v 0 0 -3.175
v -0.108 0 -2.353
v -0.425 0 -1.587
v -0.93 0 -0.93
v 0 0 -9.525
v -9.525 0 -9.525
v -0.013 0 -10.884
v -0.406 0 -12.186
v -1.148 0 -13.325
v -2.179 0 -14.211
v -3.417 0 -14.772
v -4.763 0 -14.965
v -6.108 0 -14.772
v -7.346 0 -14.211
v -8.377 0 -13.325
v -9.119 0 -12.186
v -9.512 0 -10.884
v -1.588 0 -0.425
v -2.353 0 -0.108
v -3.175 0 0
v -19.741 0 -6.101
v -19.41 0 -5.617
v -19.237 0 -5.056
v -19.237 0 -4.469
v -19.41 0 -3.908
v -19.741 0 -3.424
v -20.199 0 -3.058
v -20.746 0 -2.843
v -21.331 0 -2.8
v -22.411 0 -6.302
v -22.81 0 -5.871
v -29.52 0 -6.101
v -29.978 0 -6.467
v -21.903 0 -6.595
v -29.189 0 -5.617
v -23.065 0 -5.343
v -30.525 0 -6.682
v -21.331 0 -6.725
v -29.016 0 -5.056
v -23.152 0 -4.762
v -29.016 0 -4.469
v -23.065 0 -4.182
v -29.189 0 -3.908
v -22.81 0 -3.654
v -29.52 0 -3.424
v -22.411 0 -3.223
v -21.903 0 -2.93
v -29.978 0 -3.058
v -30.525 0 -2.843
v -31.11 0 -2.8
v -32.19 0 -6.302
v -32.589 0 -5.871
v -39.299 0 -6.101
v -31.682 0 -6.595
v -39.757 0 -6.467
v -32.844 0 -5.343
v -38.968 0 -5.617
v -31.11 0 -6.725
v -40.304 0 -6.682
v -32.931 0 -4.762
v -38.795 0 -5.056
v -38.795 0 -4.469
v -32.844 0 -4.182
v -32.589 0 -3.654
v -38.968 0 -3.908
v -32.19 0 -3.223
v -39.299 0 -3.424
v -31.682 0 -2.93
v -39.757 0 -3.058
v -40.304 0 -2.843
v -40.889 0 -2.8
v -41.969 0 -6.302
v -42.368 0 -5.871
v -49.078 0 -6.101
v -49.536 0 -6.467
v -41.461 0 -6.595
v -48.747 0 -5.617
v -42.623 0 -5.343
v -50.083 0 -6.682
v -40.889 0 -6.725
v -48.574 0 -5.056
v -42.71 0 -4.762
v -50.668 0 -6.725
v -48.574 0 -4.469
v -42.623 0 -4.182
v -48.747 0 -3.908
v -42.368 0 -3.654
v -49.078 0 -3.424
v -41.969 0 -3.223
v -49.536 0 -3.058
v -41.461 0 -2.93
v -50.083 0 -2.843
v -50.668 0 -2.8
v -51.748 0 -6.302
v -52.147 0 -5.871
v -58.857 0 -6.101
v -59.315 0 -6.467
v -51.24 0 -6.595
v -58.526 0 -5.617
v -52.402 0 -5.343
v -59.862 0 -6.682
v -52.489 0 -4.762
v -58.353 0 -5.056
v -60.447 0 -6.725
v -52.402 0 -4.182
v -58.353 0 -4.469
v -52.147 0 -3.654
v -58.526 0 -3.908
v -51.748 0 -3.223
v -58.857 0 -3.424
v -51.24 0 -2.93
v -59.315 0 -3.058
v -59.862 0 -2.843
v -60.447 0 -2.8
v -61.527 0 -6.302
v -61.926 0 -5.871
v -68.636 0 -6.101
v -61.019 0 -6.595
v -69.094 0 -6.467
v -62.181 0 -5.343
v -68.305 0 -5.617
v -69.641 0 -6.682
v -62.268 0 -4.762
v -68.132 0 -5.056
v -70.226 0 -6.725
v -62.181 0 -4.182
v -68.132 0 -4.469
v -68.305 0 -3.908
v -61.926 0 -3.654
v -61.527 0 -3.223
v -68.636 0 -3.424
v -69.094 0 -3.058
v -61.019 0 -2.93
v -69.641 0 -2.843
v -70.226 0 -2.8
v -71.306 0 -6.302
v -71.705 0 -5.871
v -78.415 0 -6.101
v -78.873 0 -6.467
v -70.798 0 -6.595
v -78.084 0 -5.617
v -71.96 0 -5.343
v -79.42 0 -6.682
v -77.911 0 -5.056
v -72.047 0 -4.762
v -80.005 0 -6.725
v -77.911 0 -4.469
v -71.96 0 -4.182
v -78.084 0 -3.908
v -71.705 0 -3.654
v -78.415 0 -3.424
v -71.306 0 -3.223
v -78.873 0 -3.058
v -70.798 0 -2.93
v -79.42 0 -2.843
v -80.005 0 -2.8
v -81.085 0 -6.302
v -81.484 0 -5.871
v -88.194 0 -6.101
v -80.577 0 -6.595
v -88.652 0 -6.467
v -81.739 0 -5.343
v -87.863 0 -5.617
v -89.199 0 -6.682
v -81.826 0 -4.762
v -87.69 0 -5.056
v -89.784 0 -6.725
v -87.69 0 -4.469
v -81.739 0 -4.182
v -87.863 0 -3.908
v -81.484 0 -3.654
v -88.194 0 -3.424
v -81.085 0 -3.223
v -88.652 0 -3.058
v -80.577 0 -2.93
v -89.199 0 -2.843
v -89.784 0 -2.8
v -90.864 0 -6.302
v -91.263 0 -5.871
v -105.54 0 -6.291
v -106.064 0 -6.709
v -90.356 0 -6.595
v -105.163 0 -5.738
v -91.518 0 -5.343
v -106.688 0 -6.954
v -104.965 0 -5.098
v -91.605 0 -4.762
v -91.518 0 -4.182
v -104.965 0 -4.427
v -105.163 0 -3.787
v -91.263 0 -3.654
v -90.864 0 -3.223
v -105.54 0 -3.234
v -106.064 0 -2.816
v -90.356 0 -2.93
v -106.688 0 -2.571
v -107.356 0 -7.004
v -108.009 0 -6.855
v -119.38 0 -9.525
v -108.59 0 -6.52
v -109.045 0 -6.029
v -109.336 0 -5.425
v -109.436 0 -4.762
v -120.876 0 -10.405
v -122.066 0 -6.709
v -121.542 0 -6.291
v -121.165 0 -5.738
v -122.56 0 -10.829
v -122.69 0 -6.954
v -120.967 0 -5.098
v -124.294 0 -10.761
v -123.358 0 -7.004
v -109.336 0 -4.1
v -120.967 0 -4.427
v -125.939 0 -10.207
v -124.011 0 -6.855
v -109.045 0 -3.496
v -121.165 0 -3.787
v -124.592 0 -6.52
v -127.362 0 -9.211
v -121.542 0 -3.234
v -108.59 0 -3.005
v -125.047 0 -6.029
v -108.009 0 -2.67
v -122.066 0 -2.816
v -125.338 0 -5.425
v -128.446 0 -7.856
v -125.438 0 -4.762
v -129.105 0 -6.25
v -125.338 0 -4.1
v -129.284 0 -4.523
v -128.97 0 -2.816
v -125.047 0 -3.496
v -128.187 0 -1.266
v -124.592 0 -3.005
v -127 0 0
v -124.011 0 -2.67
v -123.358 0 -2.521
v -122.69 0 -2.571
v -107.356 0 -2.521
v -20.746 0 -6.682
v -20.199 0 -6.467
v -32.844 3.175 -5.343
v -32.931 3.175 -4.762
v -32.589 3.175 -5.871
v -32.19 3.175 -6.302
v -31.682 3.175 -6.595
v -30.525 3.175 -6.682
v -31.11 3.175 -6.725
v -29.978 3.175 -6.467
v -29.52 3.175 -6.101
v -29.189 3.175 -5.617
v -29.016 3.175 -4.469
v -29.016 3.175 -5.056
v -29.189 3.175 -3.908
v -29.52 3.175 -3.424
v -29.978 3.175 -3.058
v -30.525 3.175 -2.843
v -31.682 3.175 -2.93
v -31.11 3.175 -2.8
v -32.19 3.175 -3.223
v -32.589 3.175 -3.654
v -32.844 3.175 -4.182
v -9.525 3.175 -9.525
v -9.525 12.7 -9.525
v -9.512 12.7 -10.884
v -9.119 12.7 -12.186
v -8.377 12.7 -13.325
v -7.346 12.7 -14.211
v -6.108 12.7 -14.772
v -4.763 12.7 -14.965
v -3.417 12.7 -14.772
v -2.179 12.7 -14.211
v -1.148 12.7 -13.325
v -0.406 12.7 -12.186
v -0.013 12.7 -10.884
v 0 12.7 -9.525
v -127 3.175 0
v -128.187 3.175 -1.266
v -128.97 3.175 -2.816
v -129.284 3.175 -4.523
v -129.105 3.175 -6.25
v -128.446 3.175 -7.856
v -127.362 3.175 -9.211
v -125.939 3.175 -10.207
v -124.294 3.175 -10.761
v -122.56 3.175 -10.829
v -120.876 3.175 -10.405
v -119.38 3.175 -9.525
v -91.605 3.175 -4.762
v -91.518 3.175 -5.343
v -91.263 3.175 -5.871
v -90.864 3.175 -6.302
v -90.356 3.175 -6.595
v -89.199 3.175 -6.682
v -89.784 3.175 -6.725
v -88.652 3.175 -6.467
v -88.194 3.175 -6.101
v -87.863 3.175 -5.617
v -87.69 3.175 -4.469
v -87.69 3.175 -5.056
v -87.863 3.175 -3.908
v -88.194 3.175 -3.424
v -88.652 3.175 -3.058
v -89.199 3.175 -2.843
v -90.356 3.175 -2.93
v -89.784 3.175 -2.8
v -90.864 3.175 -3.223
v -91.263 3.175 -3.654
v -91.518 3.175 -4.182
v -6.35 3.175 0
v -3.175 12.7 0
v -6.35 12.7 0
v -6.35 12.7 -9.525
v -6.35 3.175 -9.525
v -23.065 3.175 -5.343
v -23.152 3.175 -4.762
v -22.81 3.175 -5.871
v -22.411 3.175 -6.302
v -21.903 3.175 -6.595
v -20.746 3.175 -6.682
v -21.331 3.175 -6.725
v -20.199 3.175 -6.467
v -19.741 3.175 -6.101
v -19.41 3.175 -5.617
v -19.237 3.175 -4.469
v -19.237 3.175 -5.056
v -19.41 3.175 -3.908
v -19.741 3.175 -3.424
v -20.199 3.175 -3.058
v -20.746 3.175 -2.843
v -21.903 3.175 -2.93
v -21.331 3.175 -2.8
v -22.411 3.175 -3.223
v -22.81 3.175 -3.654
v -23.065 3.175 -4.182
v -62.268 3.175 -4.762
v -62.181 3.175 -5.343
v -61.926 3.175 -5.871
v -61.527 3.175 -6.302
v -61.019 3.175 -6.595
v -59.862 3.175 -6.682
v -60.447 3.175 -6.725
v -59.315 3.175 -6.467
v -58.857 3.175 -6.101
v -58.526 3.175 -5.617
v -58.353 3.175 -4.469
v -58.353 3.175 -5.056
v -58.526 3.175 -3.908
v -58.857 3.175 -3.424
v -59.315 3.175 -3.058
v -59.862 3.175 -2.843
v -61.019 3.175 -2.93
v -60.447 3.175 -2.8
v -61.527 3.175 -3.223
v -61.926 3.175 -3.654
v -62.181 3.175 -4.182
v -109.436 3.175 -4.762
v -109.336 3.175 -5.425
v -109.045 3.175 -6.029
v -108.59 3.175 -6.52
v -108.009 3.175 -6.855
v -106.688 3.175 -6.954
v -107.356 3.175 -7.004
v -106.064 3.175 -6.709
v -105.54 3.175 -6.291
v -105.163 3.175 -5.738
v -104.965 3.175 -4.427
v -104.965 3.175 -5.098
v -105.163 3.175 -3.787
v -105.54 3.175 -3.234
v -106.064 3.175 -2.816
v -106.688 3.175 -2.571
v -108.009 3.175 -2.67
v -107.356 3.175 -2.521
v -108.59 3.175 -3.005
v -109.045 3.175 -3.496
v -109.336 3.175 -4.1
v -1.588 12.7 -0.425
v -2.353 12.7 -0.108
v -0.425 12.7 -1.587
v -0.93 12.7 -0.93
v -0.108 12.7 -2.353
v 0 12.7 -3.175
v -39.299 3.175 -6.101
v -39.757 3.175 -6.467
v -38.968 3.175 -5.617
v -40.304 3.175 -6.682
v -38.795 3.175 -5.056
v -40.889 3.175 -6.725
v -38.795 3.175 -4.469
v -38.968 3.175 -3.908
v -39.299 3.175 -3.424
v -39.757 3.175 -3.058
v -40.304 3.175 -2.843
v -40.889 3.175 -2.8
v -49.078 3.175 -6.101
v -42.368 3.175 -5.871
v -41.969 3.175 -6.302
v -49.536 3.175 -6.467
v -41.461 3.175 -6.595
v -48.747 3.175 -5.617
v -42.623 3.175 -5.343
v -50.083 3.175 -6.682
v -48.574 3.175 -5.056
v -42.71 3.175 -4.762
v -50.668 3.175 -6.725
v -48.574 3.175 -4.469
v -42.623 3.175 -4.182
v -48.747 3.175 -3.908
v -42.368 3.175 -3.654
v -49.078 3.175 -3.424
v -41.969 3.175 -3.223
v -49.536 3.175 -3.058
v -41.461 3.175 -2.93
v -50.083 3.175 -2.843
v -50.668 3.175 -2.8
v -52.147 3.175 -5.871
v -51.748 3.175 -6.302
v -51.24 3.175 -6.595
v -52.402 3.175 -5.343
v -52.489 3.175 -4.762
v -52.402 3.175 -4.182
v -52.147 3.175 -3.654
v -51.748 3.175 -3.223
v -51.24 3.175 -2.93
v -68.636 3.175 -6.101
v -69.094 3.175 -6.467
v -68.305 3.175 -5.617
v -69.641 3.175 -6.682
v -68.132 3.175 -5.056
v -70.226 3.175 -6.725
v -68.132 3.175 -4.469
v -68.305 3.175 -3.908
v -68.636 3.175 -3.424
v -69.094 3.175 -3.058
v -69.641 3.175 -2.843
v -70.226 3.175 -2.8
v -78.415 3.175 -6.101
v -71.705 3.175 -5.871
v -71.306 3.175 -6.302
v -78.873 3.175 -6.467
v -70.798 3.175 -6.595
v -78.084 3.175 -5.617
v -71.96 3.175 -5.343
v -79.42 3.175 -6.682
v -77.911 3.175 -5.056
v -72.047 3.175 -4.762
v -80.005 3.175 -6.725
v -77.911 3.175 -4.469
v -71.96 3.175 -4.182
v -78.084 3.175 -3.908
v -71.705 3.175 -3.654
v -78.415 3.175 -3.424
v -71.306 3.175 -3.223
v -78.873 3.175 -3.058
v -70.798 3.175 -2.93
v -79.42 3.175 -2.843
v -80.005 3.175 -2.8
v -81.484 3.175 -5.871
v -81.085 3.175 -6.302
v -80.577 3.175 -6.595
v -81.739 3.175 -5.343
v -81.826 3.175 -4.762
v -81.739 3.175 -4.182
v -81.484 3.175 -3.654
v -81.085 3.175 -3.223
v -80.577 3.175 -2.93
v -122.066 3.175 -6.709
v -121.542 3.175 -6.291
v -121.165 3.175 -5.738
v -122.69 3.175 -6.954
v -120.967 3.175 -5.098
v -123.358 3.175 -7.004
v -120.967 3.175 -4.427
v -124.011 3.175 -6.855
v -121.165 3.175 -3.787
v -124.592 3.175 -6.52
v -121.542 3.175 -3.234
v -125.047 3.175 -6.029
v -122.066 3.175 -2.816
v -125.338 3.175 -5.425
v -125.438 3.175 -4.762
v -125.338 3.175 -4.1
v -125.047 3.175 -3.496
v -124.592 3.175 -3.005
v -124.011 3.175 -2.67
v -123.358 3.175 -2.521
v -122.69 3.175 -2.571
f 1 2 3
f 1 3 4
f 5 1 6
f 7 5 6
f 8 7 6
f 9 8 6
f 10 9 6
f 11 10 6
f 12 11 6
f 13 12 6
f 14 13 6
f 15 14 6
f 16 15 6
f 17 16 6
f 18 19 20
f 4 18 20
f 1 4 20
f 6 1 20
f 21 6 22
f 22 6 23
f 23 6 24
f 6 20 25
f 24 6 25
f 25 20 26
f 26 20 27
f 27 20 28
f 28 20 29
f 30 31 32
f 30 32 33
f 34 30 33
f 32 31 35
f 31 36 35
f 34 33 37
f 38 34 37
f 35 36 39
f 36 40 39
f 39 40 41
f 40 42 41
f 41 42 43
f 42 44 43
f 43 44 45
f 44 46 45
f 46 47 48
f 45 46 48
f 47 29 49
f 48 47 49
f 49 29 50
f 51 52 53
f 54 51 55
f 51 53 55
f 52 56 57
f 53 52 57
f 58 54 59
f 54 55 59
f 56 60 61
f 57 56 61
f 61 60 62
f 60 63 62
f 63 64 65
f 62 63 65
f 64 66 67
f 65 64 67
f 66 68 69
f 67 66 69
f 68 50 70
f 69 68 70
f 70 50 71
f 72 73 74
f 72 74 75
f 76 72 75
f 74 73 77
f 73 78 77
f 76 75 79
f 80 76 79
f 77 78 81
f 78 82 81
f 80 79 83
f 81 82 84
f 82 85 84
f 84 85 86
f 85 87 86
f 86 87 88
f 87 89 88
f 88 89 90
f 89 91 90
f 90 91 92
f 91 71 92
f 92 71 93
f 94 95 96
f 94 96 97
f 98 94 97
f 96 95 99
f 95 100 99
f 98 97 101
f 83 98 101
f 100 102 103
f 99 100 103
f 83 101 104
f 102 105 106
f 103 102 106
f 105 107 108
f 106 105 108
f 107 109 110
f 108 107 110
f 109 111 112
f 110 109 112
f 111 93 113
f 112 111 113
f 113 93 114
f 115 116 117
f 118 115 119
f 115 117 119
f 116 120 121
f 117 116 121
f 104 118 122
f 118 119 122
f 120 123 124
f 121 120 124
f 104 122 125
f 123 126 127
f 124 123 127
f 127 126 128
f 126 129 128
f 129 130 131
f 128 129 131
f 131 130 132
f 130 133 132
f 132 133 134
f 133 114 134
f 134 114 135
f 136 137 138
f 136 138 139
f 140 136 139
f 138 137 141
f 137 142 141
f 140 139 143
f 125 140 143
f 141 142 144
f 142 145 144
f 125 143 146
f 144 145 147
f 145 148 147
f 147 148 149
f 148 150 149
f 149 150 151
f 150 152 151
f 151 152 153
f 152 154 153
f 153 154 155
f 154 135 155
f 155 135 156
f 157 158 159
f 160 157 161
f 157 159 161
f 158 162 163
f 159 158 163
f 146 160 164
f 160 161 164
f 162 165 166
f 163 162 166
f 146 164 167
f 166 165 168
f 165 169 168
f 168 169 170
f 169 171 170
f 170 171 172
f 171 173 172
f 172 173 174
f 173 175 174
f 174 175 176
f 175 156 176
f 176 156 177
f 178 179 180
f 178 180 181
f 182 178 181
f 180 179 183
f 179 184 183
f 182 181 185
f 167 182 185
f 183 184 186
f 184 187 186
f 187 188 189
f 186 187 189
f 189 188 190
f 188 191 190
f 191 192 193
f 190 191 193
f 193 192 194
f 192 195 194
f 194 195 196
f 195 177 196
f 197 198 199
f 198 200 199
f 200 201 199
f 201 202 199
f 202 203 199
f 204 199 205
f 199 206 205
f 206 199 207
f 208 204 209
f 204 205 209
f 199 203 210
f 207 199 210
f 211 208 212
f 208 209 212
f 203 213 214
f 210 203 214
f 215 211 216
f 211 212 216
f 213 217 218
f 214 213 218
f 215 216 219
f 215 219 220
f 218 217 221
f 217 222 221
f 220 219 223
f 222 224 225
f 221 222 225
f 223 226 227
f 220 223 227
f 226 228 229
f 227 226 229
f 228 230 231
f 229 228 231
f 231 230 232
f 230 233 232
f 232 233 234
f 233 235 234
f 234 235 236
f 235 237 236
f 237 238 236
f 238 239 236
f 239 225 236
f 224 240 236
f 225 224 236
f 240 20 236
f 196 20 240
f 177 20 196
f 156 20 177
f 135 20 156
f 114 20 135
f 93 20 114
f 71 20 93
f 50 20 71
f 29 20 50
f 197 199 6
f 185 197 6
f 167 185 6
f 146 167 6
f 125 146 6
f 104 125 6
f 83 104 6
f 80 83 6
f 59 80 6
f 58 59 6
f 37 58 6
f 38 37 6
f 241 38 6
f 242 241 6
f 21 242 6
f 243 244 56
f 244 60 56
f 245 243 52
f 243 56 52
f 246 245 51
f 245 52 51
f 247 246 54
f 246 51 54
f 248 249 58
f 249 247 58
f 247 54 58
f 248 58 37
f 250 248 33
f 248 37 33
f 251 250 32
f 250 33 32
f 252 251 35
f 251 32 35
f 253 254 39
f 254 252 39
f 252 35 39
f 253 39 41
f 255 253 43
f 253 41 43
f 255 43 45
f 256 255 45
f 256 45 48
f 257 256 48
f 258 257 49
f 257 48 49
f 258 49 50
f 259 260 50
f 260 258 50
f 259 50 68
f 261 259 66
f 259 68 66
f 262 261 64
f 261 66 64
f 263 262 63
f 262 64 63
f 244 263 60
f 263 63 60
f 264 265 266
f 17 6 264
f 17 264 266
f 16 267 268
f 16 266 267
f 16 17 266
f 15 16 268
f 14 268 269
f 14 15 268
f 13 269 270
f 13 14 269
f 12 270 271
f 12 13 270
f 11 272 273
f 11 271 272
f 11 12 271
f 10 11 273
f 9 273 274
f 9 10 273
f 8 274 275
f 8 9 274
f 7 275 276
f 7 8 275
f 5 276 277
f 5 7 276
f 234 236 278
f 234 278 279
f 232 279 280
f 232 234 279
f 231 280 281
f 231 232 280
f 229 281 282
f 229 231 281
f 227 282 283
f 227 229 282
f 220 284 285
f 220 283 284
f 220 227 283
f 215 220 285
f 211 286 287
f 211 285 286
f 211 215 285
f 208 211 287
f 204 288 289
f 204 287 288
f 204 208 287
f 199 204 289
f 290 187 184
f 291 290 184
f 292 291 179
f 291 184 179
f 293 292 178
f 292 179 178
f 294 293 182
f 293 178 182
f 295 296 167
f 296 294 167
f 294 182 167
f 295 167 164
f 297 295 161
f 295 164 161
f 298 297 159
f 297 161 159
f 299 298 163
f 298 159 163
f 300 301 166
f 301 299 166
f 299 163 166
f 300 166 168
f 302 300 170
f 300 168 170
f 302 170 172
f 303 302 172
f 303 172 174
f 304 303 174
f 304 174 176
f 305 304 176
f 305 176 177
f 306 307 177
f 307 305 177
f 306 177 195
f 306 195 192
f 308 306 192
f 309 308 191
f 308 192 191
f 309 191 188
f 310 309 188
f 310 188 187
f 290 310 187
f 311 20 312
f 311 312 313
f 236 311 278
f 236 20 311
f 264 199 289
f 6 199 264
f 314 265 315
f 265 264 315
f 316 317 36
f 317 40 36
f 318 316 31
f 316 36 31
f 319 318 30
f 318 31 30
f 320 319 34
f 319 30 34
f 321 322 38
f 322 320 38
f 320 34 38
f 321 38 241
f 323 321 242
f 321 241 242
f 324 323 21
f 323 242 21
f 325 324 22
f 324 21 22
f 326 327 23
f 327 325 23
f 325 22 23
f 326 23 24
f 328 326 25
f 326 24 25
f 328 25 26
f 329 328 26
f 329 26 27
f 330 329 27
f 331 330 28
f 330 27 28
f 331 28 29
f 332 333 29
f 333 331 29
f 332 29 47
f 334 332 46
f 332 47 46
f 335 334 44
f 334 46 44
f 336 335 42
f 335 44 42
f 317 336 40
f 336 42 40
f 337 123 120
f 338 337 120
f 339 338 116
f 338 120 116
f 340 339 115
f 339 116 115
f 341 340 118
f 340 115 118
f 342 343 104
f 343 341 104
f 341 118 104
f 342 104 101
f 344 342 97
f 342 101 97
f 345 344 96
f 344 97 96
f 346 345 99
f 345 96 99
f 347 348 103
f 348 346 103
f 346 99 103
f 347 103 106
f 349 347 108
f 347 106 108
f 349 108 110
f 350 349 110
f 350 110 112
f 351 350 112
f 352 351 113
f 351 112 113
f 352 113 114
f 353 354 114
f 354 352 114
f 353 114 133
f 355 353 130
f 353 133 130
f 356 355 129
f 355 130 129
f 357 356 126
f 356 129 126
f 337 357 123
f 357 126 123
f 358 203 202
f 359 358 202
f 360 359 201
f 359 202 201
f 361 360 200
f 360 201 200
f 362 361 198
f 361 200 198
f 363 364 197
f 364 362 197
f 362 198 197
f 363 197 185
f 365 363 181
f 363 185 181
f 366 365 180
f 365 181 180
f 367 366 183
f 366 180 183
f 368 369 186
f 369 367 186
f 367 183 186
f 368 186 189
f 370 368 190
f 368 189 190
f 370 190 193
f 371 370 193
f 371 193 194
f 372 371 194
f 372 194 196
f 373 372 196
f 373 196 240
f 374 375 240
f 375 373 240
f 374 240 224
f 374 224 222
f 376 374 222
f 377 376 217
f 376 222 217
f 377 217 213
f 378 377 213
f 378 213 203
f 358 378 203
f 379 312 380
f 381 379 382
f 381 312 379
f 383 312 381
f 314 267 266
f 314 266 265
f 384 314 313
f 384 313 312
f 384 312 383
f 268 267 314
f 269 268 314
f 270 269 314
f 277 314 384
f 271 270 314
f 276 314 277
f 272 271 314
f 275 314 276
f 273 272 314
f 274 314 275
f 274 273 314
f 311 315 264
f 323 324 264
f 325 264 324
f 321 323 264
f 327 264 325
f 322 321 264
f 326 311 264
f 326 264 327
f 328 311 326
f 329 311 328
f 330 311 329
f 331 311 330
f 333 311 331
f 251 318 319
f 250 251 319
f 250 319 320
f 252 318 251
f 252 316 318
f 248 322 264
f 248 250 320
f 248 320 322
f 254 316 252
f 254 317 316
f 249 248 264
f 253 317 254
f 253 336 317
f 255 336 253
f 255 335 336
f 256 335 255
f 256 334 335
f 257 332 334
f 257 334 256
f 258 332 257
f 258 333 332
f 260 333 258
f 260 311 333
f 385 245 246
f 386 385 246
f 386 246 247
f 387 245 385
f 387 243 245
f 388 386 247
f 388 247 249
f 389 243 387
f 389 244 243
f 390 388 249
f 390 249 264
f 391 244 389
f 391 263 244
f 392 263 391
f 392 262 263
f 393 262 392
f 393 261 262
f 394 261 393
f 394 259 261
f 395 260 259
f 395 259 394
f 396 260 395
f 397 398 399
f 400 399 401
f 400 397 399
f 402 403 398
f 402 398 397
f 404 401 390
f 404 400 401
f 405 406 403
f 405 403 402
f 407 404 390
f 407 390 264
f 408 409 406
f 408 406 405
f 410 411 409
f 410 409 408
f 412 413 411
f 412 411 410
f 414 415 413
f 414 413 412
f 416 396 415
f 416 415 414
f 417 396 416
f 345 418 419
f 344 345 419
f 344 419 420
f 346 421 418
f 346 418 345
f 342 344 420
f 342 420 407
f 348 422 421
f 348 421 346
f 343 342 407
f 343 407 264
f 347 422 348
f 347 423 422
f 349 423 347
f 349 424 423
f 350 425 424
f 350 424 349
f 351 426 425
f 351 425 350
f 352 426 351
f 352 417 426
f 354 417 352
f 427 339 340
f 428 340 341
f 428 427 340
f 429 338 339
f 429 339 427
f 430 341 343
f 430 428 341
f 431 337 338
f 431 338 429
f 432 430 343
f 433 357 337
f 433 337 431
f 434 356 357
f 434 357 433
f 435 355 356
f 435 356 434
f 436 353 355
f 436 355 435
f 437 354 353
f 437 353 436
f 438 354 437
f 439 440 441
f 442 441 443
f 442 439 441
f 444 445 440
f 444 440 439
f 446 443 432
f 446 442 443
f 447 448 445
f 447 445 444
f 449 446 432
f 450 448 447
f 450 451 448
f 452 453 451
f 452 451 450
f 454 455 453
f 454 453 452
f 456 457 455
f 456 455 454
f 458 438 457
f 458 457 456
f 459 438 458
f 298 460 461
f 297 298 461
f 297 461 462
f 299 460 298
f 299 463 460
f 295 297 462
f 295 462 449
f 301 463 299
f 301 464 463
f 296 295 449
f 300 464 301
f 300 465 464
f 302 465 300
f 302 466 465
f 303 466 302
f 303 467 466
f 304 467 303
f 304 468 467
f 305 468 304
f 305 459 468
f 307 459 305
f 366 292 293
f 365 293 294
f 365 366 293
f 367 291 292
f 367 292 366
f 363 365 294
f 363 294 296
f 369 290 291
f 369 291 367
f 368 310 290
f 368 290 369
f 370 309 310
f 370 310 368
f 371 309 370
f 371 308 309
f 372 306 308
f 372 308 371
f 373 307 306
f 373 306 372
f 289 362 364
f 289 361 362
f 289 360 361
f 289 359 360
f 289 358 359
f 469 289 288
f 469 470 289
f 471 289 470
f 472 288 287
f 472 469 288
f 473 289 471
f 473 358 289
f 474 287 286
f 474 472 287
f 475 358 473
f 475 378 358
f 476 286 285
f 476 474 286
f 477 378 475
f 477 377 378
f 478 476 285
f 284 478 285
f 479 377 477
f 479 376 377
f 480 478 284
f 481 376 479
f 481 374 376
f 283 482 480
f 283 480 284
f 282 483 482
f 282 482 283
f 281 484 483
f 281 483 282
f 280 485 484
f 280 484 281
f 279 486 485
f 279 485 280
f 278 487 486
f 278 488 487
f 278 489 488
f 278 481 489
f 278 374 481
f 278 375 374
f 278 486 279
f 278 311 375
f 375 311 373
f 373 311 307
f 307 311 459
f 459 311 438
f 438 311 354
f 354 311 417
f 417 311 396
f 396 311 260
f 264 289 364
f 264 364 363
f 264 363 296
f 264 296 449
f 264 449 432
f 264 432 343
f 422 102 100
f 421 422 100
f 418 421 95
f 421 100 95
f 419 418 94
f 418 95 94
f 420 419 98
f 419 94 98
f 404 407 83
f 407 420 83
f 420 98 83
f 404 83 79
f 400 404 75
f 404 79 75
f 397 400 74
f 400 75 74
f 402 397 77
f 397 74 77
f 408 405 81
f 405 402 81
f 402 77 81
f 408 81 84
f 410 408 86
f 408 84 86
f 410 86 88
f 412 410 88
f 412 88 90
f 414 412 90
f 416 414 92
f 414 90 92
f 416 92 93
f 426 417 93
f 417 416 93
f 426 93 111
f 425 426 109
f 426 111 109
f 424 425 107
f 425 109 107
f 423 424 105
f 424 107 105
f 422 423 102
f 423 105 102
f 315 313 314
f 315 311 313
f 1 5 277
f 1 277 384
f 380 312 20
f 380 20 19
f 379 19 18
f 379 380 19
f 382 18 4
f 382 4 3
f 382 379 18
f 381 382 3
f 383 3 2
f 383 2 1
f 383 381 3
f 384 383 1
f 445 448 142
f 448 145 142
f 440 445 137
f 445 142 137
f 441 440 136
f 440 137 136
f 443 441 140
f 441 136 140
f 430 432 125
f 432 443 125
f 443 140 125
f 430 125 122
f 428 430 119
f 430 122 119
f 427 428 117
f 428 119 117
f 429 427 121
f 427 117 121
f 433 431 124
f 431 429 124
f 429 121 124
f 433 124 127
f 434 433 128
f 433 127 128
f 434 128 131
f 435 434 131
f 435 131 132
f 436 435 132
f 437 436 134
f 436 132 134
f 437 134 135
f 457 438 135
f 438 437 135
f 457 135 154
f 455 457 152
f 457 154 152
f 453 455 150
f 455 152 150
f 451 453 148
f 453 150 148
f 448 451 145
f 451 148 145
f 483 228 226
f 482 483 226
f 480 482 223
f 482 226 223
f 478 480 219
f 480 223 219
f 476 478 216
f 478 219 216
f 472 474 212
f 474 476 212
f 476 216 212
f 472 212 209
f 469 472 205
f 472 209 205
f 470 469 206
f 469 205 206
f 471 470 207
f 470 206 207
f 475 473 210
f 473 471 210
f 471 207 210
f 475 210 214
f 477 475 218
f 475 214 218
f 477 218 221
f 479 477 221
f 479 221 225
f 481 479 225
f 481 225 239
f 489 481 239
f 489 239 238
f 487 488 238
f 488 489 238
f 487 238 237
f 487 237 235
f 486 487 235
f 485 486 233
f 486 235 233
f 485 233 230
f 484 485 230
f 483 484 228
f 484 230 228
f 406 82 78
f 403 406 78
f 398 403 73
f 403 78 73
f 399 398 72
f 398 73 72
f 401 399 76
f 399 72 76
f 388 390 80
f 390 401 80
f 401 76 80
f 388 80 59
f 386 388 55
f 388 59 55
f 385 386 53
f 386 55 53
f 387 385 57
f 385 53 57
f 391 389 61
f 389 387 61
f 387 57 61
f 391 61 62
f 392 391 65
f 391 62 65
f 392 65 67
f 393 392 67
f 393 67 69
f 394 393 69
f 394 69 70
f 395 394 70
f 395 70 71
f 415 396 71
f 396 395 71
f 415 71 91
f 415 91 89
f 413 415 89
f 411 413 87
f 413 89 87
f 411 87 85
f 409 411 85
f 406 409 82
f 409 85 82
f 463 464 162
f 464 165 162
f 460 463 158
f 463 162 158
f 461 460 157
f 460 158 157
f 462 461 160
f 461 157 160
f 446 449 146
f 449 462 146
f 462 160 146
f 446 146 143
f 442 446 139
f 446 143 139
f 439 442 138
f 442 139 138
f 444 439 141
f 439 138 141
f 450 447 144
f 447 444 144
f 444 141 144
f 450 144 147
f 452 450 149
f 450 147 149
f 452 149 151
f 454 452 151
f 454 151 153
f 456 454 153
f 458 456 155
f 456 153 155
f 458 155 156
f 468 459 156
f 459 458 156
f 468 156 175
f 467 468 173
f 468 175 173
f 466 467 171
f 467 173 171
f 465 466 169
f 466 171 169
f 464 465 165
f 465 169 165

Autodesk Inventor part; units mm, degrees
ref_plane "YZ Plane" through (0, 0, 0) normal (1, 0, 0) x (0, 1, 0)
ref_plane "XZ Plane" through (0, 0, 0) normal (0, 1, 0) x (-1, 0, 0)
ref_plane "XY Plane" through (0, 0, 0) normal (0, 0, 1) x (1, 0, 0)
sketch "Sketch1" plane through (0, 0, 0) normal (0, 1, 0) x (-1, 0, 0)
  line L0 (0, 0) -> (127, 0)
  line L1 (119.38, -9.525) -> (9.525, -9.525)
  line L2 (0, -9.525) -> (0, 0)
  arc A0 (0, -9.525) -> (9.525, -9.525) centre (4.7625, -10.16) ccw
  arc A1 (119.38, -9.525) -> (127, 0) centre (123.19, -4.7625) ccw
  circle A2 centre (123.19, -4.7625) radius 2.2479
  circle A3 centre (107.188, -4.7625) radius 2.2479
  circle A4 centre (89.6366, -4.7625) radius 1.9685
  circle A5 centre (79.8576, -4.7625) radius 1.9685
  circle A6 centre (70.0786, -4.7625) radius 1.9685
  circle A7 centre (60.2996, -4.7625) radius 1.9685
  circle A8 centre (50.5206, -4.7625) radius 1.9685
  circle A9 centre (40.7416, -4.7625) radius 1.9685
  circle A10 centre (30.9626, -4.7625) radius 1.9685
  circle A11 centre (21.1836, -4.7625) radius 1.9685
  dimension "d9" = 9.525
  dimension "d10" = 127
  dimension "d11" = 4.4958
  dimension "d12" = 4.4958
  dimension "d13" = 16.002
  dimension "d14" = 3.937
  dimension "d15" = 17.5514
  dimension "d18" = 9.779
extrude "Extrusion1" add sketch "Sketch1" along normal blind 3.175
sketch "Sketch2" plane through (0, 3.175, 0) normal (0, 1, 0) x (1, 0, 0)
  circle A0 centre (-40.7416, 4.7625) radius 1.9685 construction
  arc A1 (0, 9.525) -> (-9.525, 9.525) centre (-4.7625, 10.16) ccw construction
  line L0 (0, 0) -> (-6.35, 0)
  line L1 (-6.35, 0) -> (-6.35, 9.525)
  line L2 (-9.525, 9.525) -> (-6.35, 9.525)
  line L3 (0, 9.525) -> (0, 0)
  line L4 (-127, 0) -> (0, 0) projected
  line L5 (0, 0) -> (0, 9.525) projected
  arc A2 (0, 9.525) -> (-9.525, 9.525) centre (-4.7625, 10.16) ccw
  point P0 (-4.7625, 4.7625)
  dimension "d27" = 0
  dimension "d28" = 6.35
  dimension "d32" = 0
extrude "Extrusion2" add sketch "Sketch2" along normal blind 9.525
fillet "Fillet2" radius 3.175 1 edges at (0, 6.35, 0)
properties part number "CollectorArmRear"
